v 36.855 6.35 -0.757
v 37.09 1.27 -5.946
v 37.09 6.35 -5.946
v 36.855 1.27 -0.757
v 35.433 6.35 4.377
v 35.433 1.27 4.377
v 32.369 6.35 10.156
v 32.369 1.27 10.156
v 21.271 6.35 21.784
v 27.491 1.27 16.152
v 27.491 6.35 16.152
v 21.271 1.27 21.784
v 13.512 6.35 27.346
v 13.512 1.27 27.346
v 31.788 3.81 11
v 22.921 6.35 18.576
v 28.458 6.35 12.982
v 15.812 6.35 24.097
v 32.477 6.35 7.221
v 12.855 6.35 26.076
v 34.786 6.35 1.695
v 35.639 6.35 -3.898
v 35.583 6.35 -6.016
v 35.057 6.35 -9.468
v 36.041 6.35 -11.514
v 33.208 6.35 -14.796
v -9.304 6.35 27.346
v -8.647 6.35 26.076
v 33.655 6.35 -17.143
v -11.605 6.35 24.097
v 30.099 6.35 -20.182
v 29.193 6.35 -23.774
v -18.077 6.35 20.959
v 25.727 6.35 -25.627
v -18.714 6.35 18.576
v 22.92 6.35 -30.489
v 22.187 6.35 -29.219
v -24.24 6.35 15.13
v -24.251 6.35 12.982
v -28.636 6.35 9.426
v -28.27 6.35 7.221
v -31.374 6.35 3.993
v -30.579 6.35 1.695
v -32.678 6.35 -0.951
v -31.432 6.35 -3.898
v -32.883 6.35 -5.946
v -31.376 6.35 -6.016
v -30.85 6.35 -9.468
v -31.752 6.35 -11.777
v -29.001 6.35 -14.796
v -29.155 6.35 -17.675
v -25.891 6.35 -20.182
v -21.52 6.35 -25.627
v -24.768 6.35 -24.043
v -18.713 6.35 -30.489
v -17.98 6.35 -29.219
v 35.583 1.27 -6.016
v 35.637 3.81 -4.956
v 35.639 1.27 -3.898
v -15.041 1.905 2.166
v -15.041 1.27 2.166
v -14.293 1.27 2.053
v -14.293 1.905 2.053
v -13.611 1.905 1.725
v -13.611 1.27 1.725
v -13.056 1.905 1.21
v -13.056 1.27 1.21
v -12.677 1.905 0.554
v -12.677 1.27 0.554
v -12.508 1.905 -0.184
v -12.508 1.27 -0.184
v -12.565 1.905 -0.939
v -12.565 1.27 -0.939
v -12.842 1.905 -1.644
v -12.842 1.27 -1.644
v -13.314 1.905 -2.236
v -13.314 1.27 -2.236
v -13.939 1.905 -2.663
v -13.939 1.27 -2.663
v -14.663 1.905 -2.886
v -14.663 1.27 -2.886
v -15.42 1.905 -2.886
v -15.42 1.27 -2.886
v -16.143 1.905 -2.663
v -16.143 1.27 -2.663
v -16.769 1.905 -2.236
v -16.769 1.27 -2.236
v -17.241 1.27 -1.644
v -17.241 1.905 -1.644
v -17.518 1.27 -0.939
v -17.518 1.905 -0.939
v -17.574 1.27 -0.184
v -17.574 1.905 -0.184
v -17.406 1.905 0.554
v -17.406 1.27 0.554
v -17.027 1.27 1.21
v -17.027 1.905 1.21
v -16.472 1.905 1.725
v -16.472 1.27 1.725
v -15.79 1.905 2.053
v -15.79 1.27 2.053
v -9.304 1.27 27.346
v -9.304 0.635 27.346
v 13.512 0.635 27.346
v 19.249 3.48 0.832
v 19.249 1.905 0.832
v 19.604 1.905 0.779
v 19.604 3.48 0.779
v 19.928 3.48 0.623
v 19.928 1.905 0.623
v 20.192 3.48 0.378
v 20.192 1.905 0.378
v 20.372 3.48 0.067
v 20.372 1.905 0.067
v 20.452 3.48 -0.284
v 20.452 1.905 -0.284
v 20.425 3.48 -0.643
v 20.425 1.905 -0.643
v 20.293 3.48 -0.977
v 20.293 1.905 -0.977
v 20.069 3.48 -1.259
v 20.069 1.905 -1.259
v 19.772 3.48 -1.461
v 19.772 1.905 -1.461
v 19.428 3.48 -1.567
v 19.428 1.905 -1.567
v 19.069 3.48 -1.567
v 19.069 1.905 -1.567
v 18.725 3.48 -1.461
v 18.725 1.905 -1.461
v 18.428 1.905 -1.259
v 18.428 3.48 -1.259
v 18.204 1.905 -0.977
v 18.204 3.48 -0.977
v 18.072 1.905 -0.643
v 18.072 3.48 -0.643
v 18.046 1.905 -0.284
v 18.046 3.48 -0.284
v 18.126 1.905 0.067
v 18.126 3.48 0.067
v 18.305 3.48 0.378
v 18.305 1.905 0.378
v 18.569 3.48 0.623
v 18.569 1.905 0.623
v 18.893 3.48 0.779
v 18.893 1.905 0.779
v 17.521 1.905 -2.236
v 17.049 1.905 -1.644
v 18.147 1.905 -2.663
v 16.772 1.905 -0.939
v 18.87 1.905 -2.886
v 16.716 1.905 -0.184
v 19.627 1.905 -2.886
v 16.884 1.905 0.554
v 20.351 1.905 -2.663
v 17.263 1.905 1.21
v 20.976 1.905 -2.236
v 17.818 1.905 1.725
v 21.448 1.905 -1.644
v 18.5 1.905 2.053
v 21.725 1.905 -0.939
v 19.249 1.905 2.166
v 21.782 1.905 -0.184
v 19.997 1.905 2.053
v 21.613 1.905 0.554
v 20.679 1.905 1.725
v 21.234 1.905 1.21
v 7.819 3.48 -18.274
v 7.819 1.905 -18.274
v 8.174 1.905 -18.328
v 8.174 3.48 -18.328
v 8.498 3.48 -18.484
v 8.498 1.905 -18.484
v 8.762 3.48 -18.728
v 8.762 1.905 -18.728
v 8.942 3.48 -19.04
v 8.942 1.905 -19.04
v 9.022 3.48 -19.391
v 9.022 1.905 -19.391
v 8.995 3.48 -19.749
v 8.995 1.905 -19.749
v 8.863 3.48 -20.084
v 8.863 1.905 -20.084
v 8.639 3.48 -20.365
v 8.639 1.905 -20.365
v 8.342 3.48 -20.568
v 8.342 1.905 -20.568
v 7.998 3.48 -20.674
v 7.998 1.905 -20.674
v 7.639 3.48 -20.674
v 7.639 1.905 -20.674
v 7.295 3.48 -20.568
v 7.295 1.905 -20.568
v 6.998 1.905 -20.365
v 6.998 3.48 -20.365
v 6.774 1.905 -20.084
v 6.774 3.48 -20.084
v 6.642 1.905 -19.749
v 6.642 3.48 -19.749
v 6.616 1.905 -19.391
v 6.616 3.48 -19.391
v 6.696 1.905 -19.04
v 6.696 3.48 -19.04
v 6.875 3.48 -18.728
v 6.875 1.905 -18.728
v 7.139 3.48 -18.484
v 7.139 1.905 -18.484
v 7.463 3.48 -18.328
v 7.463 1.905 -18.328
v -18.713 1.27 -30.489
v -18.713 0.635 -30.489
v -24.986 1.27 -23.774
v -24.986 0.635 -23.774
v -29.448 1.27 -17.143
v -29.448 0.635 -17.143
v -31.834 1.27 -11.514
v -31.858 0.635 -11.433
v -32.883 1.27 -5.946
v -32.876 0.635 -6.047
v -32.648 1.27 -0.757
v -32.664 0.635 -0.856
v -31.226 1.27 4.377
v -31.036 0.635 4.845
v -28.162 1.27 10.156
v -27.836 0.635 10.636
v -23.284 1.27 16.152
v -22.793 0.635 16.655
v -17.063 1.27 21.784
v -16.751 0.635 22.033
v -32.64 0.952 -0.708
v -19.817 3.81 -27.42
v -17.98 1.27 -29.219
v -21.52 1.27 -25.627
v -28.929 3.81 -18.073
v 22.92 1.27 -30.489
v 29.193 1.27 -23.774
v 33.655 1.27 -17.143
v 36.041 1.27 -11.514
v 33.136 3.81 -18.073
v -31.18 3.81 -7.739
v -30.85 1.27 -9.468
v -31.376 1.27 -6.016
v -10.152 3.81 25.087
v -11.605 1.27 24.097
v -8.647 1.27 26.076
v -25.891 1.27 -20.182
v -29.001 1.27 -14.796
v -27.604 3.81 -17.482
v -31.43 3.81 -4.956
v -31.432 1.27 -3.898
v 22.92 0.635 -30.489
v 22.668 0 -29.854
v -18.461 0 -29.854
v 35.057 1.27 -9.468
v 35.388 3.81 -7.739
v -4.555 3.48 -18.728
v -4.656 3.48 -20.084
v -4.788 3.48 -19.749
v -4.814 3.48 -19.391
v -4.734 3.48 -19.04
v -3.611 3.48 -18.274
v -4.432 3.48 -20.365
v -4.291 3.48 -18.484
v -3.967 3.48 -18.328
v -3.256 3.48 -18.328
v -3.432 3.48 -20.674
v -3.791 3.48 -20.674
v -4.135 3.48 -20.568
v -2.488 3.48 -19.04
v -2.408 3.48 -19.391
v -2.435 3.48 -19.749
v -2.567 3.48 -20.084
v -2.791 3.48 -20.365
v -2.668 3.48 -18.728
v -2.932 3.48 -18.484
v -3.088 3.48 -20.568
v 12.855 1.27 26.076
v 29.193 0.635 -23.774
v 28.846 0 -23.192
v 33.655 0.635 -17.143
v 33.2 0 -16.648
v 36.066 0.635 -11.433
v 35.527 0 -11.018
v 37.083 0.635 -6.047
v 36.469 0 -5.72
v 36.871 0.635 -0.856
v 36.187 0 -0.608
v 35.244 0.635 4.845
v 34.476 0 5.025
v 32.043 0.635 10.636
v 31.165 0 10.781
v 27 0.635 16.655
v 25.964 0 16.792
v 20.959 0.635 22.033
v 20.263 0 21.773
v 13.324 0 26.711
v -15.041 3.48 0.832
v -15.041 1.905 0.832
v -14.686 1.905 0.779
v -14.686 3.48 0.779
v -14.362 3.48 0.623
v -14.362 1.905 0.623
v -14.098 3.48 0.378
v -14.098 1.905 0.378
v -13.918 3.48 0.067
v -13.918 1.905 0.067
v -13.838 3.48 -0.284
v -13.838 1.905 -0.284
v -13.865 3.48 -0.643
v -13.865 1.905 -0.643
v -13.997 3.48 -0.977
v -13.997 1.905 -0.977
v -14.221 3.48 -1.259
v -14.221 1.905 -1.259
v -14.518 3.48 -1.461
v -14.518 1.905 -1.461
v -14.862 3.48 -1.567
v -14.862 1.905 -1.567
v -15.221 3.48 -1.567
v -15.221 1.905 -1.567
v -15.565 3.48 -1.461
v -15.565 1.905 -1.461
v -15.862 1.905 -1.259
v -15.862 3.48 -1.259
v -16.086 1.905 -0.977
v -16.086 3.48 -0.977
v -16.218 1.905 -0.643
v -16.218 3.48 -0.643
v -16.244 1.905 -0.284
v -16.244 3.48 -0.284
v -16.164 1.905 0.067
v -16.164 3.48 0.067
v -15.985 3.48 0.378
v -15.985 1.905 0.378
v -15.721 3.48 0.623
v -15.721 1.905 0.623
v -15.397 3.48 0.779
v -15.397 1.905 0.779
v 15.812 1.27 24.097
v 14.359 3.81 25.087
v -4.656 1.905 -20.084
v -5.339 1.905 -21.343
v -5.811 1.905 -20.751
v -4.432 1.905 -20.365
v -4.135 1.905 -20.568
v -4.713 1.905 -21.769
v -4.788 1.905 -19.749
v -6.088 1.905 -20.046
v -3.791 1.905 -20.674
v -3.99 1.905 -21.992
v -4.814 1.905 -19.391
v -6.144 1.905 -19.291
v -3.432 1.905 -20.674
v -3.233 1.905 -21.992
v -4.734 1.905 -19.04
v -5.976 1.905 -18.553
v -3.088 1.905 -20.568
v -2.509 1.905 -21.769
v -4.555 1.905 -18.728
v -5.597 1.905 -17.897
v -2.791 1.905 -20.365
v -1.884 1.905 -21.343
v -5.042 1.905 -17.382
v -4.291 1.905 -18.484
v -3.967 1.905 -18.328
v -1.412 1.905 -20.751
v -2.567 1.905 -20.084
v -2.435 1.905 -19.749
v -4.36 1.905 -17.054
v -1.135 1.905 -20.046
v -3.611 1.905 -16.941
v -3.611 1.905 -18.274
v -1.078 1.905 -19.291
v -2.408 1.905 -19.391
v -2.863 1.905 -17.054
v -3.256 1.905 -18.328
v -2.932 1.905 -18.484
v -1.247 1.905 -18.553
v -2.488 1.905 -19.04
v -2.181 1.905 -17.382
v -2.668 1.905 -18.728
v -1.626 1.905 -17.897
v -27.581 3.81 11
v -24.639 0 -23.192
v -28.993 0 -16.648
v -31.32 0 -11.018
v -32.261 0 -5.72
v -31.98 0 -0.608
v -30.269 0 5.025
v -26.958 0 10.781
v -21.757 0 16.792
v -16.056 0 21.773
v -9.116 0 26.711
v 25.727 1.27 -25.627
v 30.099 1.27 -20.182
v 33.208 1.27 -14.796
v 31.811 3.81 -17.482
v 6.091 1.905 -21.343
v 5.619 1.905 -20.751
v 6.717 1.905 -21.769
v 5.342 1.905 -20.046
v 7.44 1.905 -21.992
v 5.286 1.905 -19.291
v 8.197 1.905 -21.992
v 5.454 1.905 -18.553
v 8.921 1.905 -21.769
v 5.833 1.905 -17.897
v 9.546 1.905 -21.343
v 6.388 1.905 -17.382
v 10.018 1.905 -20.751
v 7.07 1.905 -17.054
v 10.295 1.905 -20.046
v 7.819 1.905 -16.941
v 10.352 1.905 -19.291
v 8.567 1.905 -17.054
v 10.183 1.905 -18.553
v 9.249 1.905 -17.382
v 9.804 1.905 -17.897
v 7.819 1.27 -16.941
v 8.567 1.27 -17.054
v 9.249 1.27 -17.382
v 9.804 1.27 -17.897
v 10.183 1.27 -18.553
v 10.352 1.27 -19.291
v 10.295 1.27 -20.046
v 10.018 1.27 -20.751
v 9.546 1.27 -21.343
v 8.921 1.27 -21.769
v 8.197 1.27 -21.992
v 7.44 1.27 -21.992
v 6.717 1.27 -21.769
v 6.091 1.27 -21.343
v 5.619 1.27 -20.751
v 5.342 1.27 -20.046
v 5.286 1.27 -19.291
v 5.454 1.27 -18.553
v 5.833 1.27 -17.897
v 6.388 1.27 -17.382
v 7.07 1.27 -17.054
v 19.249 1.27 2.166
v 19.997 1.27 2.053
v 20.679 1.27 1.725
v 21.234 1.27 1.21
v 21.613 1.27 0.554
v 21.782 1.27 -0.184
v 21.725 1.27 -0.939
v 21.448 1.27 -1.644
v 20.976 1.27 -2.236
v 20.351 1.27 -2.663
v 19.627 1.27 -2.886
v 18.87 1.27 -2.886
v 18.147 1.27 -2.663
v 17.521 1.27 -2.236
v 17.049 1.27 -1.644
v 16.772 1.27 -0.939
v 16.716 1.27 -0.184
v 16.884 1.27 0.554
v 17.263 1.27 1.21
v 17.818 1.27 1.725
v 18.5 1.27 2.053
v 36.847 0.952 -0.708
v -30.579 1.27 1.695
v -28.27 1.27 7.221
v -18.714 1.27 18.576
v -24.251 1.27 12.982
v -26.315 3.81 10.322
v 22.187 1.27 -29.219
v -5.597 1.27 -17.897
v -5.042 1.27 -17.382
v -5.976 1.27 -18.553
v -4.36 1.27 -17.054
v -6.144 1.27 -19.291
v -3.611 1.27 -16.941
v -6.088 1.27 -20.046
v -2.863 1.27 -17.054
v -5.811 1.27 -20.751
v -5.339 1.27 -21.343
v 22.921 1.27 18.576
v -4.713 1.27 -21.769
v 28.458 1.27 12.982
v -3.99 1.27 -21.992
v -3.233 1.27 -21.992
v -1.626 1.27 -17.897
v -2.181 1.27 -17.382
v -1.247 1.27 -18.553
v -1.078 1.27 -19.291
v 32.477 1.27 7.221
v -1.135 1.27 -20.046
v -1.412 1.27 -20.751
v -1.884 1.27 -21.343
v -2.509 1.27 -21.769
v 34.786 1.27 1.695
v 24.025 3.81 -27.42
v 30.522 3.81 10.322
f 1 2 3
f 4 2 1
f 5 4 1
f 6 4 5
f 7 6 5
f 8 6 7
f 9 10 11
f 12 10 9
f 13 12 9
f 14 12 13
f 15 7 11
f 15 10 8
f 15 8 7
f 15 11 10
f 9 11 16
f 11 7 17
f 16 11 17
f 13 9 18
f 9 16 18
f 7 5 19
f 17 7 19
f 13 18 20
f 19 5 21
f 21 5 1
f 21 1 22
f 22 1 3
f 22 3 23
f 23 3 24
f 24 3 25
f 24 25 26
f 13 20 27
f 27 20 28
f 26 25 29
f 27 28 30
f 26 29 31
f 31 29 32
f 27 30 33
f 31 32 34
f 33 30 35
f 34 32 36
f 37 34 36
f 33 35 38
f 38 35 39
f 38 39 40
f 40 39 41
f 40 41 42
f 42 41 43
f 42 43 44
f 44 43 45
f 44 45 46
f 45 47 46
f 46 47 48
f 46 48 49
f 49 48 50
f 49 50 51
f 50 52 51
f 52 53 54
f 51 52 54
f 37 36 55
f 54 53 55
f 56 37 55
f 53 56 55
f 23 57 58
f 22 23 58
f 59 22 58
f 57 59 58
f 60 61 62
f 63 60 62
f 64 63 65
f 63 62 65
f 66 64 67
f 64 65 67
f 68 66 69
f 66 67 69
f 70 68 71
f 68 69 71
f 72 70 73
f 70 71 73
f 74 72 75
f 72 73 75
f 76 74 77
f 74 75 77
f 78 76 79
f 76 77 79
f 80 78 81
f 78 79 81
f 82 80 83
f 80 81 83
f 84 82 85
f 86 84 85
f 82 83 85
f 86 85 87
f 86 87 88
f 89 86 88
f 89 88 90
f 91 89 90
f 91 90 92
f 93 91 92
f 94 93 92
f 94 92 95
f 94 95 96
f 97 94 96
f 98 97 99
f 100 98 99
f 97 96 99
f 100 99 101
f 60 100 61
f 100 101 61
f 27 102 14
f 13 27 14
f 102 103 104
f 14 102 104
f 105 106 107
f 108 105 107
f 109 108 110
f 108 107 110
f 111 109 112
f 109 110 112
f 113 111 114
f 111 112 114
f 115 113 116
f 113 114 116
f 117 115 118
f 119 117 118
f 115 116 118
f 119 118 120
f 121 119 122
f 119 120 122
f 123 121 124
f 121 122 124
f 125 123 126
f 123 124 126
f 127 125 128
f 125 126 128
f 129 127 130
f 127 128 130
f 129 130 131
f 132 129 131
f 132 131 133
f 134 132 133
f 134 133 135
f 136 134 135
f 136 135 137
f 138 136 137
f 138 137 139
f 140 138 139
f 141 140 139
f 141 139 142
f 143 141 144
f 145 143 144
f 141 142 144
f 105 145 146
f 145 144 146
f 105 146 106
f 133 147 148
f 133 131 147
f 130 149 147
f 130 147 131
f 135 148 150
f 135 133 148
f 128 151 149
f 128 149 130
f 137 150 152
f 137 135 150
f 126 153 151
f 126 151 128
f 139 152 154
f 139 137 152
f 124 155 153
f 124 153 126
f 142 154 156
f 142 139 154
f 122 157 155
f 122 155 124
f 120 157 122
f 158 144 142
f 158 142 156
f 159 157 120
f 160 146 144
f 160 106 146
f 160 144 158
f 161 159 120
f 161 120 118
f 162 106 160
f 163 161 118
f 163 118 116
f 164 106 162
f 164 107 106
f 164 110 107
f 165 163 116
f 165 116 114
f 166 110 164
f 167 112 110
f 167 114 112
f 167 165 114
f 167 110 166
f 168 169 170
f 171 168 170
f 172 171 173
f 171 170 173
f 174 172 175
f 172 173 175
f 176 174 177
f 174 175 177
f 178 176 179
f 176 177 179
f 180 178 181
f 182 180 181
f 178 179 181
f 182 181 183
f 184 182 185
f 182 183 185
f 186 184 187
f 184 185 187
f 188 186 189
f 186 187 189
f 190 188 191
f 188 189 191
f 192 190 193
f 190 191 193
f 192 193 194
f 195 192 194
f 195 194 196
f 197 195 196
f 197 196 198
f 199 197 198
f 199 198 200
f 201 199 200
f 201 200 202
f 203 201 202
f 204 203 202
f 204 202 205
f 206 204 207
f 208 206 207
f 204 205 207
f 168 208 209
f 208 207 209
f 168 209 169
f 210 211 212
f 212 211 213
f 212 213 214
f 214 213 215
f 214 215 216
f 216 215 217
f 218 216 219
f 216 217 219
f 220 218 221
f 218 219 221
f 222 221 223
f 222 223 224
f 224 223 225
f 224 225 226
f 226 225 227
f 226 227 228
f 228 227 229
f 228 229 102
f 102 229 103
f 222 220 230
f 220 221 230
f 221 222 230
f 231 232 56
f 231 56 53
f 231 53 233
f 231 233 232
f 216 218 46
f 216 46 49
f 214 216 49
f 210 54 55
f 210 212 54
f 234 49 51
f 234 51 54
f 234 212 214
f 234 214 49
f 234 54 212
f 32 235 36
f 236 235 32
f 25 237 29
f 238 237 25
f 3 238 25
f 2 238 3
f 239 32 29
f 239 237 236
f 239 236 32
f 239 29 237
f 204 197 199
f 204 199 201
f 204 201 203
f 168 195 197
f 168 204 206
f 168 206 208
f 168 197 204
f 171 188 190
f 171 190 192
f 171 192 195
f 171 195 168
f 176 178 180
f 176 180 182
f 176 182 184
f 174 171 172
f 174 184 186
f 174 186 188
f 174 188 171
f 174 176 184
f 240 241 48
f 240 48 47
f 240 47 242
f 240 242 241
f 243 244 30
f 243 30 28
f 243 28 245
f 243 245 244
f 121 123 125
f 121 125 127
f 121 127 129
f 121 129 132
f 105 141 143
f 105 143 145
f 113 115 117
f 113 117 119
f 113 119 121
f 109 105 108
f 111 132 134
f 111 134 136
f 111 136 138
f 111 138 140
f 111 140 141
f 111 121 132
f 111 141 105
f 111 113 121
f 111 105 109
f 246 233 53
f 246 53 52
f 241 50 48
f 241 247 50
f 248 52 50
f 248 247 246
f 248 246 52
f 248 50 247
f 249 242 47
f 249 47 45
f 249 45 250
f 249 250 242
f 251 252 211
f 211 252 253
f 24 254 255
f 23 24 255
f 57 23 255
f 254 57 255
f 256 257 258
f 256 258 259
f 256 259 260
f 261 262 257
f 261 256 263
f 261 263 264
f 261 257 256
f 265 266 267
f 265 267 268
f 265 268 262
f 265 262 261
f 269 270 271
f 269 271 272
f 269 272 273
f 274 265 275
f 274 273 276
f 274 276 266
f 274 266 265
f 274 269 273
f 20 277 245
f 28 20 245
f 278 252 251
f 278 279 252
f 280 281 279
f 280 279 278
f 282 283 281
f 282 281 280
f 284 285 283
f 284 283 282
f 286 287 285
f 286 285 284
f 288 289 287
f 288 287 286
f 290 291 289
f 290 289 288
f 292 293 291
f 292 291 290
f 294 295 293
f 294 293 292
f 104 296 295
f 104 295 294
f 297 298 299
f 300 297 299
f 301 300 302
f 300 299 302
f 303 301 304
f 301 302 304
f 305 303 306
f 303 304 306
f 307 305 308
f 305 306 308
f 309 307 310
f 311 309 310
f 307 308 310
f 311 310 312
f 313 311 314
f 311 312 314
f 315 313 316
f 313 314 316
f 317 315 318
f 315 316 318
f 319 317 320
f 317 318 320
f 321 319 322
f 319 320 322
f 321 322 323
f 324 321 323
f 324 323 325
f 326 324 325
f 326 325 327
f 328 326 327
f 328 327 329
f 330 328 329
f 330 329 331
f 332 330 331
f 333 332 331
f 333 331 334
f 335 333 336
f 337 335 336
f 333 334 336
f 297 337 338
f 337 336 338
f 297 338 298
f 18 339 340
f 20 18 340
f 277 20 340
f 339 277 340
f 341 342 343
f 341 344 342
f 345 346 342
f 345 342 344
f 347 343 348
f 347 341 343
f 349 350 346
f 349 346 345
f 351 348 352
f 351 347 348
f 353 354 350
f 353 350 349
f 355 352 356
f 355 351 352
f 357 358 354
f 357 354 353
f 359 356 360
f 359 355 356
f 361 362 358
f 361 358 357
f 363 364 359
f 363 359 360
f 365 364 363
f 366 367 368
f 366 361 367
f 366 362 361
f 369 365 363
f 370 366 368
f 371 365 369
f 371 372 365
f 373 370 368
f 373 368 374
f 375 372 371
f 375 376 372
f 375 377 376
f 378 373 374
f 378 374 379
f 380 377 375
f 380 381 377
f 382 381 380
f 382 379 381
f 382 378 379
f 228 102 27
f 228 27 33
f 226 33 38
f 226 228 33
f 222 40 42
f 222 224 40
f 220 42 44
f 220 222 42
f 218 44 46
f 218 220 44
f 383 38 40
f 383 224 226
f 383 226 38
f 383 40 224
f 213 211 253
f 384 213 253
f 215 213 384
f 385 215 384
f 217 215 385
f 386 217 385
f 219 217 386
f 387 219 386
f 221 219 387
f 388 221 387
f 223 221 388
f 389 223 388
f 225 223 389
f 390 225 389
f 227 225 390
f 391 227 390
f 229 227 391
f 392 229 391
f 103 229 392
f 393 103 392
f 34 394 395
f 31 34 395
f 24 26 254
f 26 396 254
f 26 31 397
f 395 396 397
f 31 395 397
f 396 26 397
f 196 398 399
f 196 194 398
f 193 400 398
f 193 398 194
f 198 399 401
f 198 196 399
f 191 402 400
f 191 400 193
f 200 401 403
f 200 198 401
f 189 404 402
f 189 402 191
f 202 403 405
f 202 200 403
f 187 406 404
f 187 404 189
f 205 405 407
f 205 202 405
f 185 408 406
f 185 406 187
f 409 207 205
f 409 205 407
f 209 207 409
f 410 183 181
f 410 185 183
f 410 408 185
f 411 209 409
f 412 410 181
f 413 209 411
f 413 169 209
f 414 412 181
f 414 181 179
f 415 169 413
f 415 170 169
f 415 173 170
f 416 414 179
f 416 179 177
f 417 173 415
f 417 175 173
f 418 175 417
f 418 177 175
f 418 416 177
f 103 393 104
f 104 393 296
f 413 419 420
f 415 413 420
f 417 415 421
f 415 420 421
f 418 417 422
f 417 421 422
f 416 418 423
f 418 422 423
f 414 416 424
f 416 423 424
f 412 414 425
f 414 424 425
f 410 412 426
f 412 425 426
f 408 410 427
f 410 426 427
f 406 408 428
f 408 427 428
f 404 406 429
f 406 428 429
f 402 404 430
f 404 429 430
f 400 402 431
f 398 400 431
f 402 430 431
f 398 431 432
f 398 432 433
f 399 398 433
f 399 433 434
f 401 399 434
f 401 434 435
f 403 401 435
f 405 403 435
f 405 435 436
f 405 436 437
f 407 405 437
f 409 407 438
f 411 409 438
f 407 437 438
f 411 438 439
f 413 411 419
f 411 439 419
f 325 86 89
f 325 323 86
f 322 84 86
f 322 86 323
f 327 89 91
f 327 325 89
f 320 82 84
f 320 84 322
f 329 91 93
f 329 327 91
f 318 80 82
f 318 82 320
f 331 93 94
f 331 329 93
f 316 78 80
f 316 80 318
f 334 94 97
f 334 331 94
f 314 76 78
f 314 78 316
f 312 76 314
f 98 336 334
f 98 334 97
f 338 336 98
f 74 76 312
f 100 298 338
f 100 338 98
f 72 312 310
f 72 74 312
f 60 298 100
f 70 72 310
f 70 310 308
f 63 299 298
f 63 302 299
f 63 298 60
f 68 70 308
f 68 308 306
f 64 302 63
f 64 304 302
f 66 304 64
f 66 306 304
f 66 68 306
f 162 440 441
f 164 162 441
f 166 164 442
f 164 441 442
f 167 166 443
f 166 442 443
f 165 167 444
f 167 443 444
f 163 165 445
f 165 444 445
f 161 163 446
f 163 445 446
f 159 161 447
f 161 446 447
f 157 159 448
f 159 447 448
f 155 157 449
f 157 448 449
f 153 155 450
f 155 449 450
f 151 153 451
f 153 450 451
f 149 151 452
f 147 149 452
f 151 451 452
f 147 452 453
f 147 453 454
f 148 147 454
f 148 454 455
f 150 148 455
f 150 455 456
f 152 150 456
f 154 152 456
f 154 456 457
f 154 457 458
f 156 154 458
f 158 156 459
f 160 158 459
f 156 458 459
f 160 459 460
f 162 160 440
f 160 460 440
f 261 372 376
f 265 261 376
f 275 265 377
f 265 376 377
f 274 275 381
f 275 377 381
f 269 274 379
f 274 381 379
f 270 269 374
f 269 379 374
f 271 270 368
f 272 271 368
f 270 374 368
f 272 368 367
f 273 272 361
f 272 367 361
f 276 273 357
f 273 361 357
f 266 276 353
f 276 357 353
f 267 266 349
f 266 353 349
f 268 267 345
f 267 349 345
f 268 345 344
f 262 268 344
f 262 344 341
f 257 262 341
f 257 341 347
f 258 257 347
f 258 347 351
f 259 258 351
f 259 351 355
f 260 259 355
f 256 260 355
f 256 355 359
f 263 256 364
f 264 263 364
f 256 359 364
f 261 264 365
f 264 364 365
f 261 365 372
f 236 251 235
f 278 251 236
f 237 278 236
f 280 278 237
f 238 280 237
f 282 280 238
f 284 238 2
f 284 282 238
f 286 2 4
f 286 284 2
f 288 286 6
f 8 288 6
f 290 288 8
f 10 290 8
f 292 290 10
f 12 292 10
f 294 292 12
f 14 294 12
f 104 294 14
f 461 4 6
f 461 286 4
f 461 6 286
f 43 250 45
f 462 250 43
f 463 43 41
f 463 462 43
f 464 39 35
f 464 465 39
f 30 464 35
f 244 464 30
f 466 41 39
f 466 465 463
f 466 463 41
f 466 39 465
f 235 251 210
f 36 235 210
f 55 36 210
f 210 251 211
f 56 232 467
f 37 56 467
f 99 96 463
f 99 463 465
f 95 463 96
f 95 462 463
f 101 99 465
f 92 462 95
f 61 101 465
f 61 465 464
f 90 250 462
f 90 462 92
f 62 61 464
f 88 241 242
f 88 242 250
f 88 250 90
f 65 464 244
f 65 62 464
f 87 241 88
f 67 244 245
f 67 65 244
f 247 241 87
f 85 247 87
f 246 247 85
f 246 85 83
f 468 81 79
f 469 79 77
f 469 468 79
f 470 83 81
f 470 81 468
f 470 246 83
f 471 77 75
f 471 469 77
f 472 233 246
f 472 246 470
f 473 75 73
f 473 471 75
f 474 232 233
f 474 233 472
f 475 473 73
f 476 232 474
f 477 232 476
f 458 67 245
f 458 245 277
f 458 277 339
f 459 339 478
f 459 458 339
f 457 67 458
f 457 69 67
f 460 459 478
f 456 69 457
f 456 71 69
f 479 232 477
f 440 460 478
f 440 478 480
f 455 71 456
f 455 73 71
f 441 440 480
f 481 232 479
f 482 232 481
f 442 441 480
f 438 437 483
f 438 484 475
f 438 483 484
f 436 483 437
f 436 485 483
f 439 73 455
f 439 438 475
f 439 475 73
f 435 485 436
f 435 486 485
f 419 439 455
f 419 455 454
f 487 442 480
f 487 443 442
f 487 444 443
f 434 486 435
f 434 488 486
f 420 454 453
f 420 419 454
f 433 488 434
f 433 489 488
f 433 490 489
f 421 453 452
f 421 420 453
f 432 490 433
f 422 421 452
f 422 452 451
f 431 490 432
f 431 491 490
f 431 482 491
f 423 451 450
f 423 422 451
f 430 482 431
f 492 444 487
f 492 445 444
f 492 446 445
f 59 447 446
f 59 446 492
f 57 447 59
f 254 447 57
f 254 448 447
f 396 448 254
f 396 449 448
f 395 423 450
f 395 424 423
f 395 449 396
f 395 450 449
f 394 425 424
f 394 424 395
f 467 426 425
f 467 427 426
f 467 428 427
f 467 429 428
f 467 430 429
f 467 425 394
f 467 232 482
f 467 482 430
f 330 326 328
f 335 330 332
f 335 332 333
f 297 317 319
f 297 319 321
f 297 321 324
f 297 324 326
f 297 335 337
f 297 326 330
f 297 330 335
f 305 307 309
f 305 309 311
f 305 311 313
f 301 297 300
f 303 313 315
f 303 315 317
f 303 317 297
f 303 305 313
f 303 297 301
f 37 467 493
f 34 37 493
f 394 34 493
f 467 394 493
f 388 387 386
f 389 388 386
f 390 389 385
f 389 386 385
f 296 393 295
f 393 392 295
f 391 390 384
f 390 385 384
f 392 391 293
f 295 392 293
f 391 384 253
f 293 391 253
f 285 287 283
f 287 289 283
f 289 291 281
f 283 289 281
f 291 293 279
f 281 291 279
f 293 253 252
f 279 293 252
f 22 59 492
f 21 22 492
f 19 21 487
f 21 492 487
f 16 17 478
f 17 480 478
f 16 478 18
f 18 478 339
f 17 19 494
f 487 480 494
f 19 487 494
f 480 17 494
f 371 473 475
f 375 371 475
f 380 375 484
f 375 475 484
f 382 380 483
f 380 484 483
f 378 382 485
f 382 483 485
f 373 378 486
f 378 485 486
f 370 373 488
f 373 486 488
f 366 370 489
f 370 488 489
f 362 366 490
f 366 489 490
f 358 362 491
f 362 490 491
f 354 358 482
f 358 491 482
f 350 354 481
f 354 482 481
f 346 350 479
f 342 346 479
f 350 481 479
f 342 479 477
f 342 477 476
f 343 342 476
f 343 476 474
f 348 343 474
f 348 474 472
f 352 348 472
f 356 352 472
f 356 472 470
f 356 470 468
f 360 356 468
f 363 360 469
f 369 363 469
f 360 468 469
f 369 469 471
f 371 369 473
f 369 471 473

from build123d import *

# Parameters (mm, degrees)
BOSS_EXTRUDE6_DEPTH  = 1.27
SKETCH3_R            = 2.54
SKETCH3_R_2          = 1.27
BOSS_EXTRUDE8_DEPTH  = 0.635
BOSS_EXTRUDE10_DEPTH = 5.08
SKETCH4_R            = 1.2065
BOSS_EXTRUDE9_DEPTH  = 1.5748
CHAMFER1_SIZE        = 0.635


with BuildPart() as part:
    # Sketch1 → Boss-Extrude6 (new body)
    with BuildSketch(Plane(origin=(0, 0, 0), x_dir=(1, 0, 0), z_dir=(0, 1, 0))):
        with BuildLine():
            Line((-9.304269575, -27.345620797), (13.511541223, -27.345620797))
            add(Edge.make_bspline(
                [(22.920452389, 30.489026504), (55.478836557, -0.15547818), (13.511541223, -27.345620797)],
                knots=[0, 0, 0, 1, 1, 1], degree=2))
            Line((22.920452389, 30.489026504), (-18.713180741, 30.489026504))
            add(Edge.make_bspline(
                [(-18.713180741, 30.489026504), (-51.271564909, -0.15547818), (-9.304269575, -27.345620797)],
                knots=[0, 0, 0, 1, 1, 1], degree=2))
        make_face()
    extrude(amount=BOSS_EXTRUDE6_DEPTH)

    # Sketch3 → Boss-Extrude8 (add)
    # profile 1 of 8: a face of its own
    with BuildSketch(Plane(origin=(0, 1.27, 0), x_dir=(1, 0, 0), z_dir=(0, 1, 0))):
        with Locations(Location((-15.041364176, 0.374076722, 0), (0, 0, 270))):
            Circle(SKETCH3_R)
        with Locations((-15.041364176, 0.374076722)):
            Circle(SKETCH3_R_2, mode=Mode.SUBTRACT)
    # profile 2 of 8: a face of its own
    with BuildSketch(Plane(origin=(0, 1.27, 0), x_dir=(1, 0, 0), z_dir=(0, 1, 0))):
        with Locations(Location((-3.611364176, 19.48073103, 0), (0, 0, 270))):
            Circle(SKETCH3_R)
        with Locations((-3.611364176, 19.48073103)):
            Circle(SKETCH3_R_2, mode=Mode.SUBTRACT)
    # profile 3 of 8: a face of its own
    with BuildSketch(Plane(origin=(0, 1.27, 0), x_dir=(1, 0, 0), z_dir=(0, 1, 0))):
        with Locations(Location((7.818635824, 19.48073103, 0), (0, 0, 270))):
            Circle(SKETCH3_R)
        with Locations((7.818635824, 19.48073103)):
            Circle(SKETCH3_R_2, mode=Mode.SUBTRACT)
    # profile 4 of 8: a face of its own
    with BuildSketch(Plane(origin=(0, 1.27, 0), x_dir=(1, 0, 0), z_dir=(0, 1, 0))):
        with Locations(Location((19.248635824, 0.374076722, 0), (0, 0, 270))):
            Circle(SKETCH3_R)
        with Locations((19.248635824, 0.374076722)):
            Circle(SKETCH3_R_2, mode=Mode.SUBTRACT)
    # profile 5 of 8: a face of its own
    with BuildSketch(Plane(origin=(0, 1.27, 0), x_dir=(1, 0, 0), z_dir=(0, 1, 0))):
        with Locations((-15.041364176, 0.374076722)):
            Circle(SKETCH3_R_2)
    # profile 6 of 8: a face of its own
    with BuildSketch(Plane(origin=(0, 1.27, 0), x_dir=(1, 0, 0), z_dir=(0, 1, 0))):
        with Locations((-3.611364176, 19.48073103)):
            Circle(SKETCH3_R_2)
    # profile 7 of 8: a face of its own
    with BuildSketch(Plane(origin=(0, 1.27, 0), x_dir=(1, 0, 0), z_dir=(0, 1, 0))):
        with Locations((7.818635824, 19.48073103)):
            Circle(SKETCH3_R_2)
    # profile 8 of 8: a face of its own
    with BuildSketch(Plane(origin=(0, 1.27, 0), x_dir=(1, 0, 0), z_dir=(0, 1, 0))):
        with Locations((19.248635824, 0.374076722)):
            Circle(SKETCH3_R_2)
    extrude(amount=BOSS_EXTRUDE8_DEPTH)

    # Sketch2 → Boss-Extrude10 (add)
    with BuildSketch(Plane(origin=(0, 1.27, 0), x_dir=(1, 0, 0), z_dir=(0, 1, 0))):
        with BuildLine():
            add(Edge.make_bspline(
                [(-32.882940994, 5.946281814), (-32.05929394, 17.927437872), (-18.713180741, 30.489026504)],
                knots=[0.590086746, 0.590086746, 0.590086746, 1, 1, 1], degree=2))
            Line((-32.882940994, 5.946281814), (-30.849557533, 9.46820528))
            add(Edge.make_bspline(
                [(-21.52012223, 25.627261232), (-29.022947824, 17.416183265), (-30.849557533, 9.46820528)],
                knots=[0.061508066, 0.061508066, 0.061508066, 0.343715302, 0.343715302, 0.343715302], degree=2))
            Line((-21.52012223, 25.627261232), (-18.713180741, 30.489026504))
        make_face()
        with BuildLine():
            Line((-30.849557533, 9.46820528), (-32.882940994, 5.946281814))
            Line((-32.882940994, 5.946281814), (-31.432013688, 3.897645158))
            add(Edge.make_bspline(
                [(-31.376148124, 6.016123622), (-31.455454937, 4.954503137), (-31.432013688, 3.897645158)],
                knots=[0.405223368, 0.405223368, 0.405223368, 0.443192049, 0.443192049, 0.443192049], degree=2))
            add(Edge.make_bspline(
                [(-30.849557533, 9.46820528), (-31.247673588, 7.735915333), (-31.376148124, 6.016123622)],
                knots=[0.343715302, 0.343715302, 0.343715302, 0.405223368, 0.405223368, 0.405223368], degree=2))
        make_face()
        with BuildLine():
            add(Edge.make_bspline(
                [(-9.304269575, -27.345620797), (-34.068614317, -11.301078017), (-32.882940994, 5.946281814)],
                knots=[0, 0, 0, 0.590086746, 0.590086746, 0.590086746], degree=2))
            Line((-9.304269575, -27.345620797), (-11.605197436, -24.096825947))
            add(Edge.make_bspline(
                [(-31.432013688, 3.897645158), (-31.111690719, -10.544242355), (-11.605197436, -24.096825947)],
                knots=[0.443192049, 0.443192049, 0.443192049, 0.962031319, 0.962031319, 0.962031319], degree=2))
            Line((-31.432013688, 3.897645158), (-32.882940994, 5.946281814))
        make_face()
        with BuildLine():
            Line((35.056829181, 9.46820528), (37.090212642, 5.946281814))
            add(Edge.make_bspline(
                [(22.920452389, 30.489026504), (36.266565588, 17.927437872), (37.090212642, 5.946281814)],
                knots=[0, 0, 0, 0.409913254, 0.409913254, 0.409913254], degree=2))
            Line((22.920452389, 30.489026504), (25.727393878, 25.627261232))
            add(Edge.make_bspline(
                [(25.727393878, 25.627261232), (33.230219472, 17.416183265), (35.056829181, 9.46820528)],
                knots=[0.061508066, 0.061508066, 0.061508066, 0.343715302, 0.343715302, 0.343715302], degree=2))
        make_face()
        with BuildLine():
            Line((35.639285336, 3.897645158), (37.090212642, 5.946281814))
            Line((37.090212642, 5.946281814), (35.056829181, 9.46820528))
            add(Edge.make_bspline(
                [(35.056829181, 9.46820528), (35.454945236, 7.735915333), (35.583419772, 6.016123622)],
                knots=[0.343715302, 0.343715302, 0.343715302, 0.405223368, 0.405223368, 0.405223368], degree=2))
            add(Edge.make_bspline(
                [(35.583419772, 6.016123622), (35.662726585, 4.954503137), (35.639285336, 3.897645158)],
                knots=[0.405223368, 0.405223368, 0.405223368, 0.443192049, 0.443192049, 0.443192049], degree=2))
        make_face()
        with BuildLine():
            Line((15.812469084, -24.096825947), (13.511541223, -27.345620797))
            add(Edge.make_bspline(
                [(37.090212642, 5.946281814), (38.275885965, -11.301078017), (13.511541223, -27.345620797)],
                knots=[0.409913254, 0.409913254, 0.409913254, 1, 1, 1], degree=2))
            Line((37.090212642, 5.946281814), (35.639285336, 3.897645158))
            add(Edge.make_bspline(
                [(35.639285336, 3.897645158), (35.318962367, -10.544242355), (15.812469084, -24.096825947)],
                knots=[0.443192049, 0.443192049, 0.443192049, 0.962031319, 0.962031319, 0.962031319], degree=2))
        make_face()
        with BuildLine():
            Line((-9.304269575, -27.345620797), (13.511541223, -27.345620797))
            Line((13.511541223, -27.345620797), (15.812469084, -24.096825947))
            add(Edge.make_bspline(
                [(15.812469084, -24.096825947), (14.384983027, -25.088604625), (12.854748908, -26.075620797)],
                knots=[0.962031319, 0.962031319, 0.962031319, 1, 1, 1], degree=2))
            Line((12.854748908, -26.075620797), (-8.64747726, -26.075620797))
            add(Edge.make_bspline(
                [(-11.605197436, -24.096825947), (-10.177711379, -25.088604625), (-8.64747726, -26.075620797)],
                knots=[0.962031319, 0.962031319, 0.962031319, 1, 1, 1], degree=2))
            Line((-11.605197436, -24.096825947), (-9.304269575, -27.345620797))
        make_face()
        with BuildLine():
            Line((25.727393878, 25.627261232), (22.920452389, 30.489026504))
            Line((22.920452389, 30.489026504), (-18.713180741, 30.489026504))
            Line((-18.713180741, 30.489026504), (-21.52012223, 25.627261232))
            add(Edge.make_bspline(
                [(-17.979945899, 29.219026504), (-19.884854823, 27.416894751), (-21.52012223, 25.627261232)],
                knots=[0, 0, 0, 0.061508066, 0.061508066, 0.061508066], degree=2))
            Line((-17.979945899, 29.219026504), (22.187217547, 29.219026504))
            add(Edge.make_bspline(
                [(22.187217547, 29.219026504), (24.092126471, 27.416894751), (25.727393878, 25.627261232)],
                knots=[0, 0, 0, 0.061508066, 0.061508066, 0.061508066], degree=2))
        make_face()
    extrude(amount=BOSS_EXTRUDE10_DEPTH)

    # Sketch4 → Boss-Extrude9 (add)
    with BuildSketch(Plane(origin=(0, 1.905, 0), x_dir=(1, 0, 0), z_dir=(0, 1, 0))):
        with Locations(Location((-15.041364176, 0.374076722, 0), (0, 0, 270))):
            Circle(SKETCH4_R)
        with Locations(Location((-3.611364176, 19.48073103, 0), (0, 0, 270))):
            Circle(SKETCH4_R)
        with Locations(Location((7.818635824, 19.48073103, 0), (0, 0, 270))):
            Circle(SKETCH4_R)
        with Locations(Location((19.248635824, 0.374076722, 0), (0, 0, 270))):
            Circle(SKETCH4_R)
    extrude(amount=BOSS_EXTRUDE9_DEPTH)

    # Chamfer1
    chamfer1_edges = [part.edges().sort_by_distance(p)[0] for p in [
        (2.103635824, 0, 27.345620797),
        (-32.321436727, 0, 0.895081973),
        (36.528708375, 0, 0.895081973),
        (2.103635824, 0, -30.489026504),
    ]]
    chamfer(chamfer1_edges, length=CHAMFER1_SIZE)


solid = part.part
